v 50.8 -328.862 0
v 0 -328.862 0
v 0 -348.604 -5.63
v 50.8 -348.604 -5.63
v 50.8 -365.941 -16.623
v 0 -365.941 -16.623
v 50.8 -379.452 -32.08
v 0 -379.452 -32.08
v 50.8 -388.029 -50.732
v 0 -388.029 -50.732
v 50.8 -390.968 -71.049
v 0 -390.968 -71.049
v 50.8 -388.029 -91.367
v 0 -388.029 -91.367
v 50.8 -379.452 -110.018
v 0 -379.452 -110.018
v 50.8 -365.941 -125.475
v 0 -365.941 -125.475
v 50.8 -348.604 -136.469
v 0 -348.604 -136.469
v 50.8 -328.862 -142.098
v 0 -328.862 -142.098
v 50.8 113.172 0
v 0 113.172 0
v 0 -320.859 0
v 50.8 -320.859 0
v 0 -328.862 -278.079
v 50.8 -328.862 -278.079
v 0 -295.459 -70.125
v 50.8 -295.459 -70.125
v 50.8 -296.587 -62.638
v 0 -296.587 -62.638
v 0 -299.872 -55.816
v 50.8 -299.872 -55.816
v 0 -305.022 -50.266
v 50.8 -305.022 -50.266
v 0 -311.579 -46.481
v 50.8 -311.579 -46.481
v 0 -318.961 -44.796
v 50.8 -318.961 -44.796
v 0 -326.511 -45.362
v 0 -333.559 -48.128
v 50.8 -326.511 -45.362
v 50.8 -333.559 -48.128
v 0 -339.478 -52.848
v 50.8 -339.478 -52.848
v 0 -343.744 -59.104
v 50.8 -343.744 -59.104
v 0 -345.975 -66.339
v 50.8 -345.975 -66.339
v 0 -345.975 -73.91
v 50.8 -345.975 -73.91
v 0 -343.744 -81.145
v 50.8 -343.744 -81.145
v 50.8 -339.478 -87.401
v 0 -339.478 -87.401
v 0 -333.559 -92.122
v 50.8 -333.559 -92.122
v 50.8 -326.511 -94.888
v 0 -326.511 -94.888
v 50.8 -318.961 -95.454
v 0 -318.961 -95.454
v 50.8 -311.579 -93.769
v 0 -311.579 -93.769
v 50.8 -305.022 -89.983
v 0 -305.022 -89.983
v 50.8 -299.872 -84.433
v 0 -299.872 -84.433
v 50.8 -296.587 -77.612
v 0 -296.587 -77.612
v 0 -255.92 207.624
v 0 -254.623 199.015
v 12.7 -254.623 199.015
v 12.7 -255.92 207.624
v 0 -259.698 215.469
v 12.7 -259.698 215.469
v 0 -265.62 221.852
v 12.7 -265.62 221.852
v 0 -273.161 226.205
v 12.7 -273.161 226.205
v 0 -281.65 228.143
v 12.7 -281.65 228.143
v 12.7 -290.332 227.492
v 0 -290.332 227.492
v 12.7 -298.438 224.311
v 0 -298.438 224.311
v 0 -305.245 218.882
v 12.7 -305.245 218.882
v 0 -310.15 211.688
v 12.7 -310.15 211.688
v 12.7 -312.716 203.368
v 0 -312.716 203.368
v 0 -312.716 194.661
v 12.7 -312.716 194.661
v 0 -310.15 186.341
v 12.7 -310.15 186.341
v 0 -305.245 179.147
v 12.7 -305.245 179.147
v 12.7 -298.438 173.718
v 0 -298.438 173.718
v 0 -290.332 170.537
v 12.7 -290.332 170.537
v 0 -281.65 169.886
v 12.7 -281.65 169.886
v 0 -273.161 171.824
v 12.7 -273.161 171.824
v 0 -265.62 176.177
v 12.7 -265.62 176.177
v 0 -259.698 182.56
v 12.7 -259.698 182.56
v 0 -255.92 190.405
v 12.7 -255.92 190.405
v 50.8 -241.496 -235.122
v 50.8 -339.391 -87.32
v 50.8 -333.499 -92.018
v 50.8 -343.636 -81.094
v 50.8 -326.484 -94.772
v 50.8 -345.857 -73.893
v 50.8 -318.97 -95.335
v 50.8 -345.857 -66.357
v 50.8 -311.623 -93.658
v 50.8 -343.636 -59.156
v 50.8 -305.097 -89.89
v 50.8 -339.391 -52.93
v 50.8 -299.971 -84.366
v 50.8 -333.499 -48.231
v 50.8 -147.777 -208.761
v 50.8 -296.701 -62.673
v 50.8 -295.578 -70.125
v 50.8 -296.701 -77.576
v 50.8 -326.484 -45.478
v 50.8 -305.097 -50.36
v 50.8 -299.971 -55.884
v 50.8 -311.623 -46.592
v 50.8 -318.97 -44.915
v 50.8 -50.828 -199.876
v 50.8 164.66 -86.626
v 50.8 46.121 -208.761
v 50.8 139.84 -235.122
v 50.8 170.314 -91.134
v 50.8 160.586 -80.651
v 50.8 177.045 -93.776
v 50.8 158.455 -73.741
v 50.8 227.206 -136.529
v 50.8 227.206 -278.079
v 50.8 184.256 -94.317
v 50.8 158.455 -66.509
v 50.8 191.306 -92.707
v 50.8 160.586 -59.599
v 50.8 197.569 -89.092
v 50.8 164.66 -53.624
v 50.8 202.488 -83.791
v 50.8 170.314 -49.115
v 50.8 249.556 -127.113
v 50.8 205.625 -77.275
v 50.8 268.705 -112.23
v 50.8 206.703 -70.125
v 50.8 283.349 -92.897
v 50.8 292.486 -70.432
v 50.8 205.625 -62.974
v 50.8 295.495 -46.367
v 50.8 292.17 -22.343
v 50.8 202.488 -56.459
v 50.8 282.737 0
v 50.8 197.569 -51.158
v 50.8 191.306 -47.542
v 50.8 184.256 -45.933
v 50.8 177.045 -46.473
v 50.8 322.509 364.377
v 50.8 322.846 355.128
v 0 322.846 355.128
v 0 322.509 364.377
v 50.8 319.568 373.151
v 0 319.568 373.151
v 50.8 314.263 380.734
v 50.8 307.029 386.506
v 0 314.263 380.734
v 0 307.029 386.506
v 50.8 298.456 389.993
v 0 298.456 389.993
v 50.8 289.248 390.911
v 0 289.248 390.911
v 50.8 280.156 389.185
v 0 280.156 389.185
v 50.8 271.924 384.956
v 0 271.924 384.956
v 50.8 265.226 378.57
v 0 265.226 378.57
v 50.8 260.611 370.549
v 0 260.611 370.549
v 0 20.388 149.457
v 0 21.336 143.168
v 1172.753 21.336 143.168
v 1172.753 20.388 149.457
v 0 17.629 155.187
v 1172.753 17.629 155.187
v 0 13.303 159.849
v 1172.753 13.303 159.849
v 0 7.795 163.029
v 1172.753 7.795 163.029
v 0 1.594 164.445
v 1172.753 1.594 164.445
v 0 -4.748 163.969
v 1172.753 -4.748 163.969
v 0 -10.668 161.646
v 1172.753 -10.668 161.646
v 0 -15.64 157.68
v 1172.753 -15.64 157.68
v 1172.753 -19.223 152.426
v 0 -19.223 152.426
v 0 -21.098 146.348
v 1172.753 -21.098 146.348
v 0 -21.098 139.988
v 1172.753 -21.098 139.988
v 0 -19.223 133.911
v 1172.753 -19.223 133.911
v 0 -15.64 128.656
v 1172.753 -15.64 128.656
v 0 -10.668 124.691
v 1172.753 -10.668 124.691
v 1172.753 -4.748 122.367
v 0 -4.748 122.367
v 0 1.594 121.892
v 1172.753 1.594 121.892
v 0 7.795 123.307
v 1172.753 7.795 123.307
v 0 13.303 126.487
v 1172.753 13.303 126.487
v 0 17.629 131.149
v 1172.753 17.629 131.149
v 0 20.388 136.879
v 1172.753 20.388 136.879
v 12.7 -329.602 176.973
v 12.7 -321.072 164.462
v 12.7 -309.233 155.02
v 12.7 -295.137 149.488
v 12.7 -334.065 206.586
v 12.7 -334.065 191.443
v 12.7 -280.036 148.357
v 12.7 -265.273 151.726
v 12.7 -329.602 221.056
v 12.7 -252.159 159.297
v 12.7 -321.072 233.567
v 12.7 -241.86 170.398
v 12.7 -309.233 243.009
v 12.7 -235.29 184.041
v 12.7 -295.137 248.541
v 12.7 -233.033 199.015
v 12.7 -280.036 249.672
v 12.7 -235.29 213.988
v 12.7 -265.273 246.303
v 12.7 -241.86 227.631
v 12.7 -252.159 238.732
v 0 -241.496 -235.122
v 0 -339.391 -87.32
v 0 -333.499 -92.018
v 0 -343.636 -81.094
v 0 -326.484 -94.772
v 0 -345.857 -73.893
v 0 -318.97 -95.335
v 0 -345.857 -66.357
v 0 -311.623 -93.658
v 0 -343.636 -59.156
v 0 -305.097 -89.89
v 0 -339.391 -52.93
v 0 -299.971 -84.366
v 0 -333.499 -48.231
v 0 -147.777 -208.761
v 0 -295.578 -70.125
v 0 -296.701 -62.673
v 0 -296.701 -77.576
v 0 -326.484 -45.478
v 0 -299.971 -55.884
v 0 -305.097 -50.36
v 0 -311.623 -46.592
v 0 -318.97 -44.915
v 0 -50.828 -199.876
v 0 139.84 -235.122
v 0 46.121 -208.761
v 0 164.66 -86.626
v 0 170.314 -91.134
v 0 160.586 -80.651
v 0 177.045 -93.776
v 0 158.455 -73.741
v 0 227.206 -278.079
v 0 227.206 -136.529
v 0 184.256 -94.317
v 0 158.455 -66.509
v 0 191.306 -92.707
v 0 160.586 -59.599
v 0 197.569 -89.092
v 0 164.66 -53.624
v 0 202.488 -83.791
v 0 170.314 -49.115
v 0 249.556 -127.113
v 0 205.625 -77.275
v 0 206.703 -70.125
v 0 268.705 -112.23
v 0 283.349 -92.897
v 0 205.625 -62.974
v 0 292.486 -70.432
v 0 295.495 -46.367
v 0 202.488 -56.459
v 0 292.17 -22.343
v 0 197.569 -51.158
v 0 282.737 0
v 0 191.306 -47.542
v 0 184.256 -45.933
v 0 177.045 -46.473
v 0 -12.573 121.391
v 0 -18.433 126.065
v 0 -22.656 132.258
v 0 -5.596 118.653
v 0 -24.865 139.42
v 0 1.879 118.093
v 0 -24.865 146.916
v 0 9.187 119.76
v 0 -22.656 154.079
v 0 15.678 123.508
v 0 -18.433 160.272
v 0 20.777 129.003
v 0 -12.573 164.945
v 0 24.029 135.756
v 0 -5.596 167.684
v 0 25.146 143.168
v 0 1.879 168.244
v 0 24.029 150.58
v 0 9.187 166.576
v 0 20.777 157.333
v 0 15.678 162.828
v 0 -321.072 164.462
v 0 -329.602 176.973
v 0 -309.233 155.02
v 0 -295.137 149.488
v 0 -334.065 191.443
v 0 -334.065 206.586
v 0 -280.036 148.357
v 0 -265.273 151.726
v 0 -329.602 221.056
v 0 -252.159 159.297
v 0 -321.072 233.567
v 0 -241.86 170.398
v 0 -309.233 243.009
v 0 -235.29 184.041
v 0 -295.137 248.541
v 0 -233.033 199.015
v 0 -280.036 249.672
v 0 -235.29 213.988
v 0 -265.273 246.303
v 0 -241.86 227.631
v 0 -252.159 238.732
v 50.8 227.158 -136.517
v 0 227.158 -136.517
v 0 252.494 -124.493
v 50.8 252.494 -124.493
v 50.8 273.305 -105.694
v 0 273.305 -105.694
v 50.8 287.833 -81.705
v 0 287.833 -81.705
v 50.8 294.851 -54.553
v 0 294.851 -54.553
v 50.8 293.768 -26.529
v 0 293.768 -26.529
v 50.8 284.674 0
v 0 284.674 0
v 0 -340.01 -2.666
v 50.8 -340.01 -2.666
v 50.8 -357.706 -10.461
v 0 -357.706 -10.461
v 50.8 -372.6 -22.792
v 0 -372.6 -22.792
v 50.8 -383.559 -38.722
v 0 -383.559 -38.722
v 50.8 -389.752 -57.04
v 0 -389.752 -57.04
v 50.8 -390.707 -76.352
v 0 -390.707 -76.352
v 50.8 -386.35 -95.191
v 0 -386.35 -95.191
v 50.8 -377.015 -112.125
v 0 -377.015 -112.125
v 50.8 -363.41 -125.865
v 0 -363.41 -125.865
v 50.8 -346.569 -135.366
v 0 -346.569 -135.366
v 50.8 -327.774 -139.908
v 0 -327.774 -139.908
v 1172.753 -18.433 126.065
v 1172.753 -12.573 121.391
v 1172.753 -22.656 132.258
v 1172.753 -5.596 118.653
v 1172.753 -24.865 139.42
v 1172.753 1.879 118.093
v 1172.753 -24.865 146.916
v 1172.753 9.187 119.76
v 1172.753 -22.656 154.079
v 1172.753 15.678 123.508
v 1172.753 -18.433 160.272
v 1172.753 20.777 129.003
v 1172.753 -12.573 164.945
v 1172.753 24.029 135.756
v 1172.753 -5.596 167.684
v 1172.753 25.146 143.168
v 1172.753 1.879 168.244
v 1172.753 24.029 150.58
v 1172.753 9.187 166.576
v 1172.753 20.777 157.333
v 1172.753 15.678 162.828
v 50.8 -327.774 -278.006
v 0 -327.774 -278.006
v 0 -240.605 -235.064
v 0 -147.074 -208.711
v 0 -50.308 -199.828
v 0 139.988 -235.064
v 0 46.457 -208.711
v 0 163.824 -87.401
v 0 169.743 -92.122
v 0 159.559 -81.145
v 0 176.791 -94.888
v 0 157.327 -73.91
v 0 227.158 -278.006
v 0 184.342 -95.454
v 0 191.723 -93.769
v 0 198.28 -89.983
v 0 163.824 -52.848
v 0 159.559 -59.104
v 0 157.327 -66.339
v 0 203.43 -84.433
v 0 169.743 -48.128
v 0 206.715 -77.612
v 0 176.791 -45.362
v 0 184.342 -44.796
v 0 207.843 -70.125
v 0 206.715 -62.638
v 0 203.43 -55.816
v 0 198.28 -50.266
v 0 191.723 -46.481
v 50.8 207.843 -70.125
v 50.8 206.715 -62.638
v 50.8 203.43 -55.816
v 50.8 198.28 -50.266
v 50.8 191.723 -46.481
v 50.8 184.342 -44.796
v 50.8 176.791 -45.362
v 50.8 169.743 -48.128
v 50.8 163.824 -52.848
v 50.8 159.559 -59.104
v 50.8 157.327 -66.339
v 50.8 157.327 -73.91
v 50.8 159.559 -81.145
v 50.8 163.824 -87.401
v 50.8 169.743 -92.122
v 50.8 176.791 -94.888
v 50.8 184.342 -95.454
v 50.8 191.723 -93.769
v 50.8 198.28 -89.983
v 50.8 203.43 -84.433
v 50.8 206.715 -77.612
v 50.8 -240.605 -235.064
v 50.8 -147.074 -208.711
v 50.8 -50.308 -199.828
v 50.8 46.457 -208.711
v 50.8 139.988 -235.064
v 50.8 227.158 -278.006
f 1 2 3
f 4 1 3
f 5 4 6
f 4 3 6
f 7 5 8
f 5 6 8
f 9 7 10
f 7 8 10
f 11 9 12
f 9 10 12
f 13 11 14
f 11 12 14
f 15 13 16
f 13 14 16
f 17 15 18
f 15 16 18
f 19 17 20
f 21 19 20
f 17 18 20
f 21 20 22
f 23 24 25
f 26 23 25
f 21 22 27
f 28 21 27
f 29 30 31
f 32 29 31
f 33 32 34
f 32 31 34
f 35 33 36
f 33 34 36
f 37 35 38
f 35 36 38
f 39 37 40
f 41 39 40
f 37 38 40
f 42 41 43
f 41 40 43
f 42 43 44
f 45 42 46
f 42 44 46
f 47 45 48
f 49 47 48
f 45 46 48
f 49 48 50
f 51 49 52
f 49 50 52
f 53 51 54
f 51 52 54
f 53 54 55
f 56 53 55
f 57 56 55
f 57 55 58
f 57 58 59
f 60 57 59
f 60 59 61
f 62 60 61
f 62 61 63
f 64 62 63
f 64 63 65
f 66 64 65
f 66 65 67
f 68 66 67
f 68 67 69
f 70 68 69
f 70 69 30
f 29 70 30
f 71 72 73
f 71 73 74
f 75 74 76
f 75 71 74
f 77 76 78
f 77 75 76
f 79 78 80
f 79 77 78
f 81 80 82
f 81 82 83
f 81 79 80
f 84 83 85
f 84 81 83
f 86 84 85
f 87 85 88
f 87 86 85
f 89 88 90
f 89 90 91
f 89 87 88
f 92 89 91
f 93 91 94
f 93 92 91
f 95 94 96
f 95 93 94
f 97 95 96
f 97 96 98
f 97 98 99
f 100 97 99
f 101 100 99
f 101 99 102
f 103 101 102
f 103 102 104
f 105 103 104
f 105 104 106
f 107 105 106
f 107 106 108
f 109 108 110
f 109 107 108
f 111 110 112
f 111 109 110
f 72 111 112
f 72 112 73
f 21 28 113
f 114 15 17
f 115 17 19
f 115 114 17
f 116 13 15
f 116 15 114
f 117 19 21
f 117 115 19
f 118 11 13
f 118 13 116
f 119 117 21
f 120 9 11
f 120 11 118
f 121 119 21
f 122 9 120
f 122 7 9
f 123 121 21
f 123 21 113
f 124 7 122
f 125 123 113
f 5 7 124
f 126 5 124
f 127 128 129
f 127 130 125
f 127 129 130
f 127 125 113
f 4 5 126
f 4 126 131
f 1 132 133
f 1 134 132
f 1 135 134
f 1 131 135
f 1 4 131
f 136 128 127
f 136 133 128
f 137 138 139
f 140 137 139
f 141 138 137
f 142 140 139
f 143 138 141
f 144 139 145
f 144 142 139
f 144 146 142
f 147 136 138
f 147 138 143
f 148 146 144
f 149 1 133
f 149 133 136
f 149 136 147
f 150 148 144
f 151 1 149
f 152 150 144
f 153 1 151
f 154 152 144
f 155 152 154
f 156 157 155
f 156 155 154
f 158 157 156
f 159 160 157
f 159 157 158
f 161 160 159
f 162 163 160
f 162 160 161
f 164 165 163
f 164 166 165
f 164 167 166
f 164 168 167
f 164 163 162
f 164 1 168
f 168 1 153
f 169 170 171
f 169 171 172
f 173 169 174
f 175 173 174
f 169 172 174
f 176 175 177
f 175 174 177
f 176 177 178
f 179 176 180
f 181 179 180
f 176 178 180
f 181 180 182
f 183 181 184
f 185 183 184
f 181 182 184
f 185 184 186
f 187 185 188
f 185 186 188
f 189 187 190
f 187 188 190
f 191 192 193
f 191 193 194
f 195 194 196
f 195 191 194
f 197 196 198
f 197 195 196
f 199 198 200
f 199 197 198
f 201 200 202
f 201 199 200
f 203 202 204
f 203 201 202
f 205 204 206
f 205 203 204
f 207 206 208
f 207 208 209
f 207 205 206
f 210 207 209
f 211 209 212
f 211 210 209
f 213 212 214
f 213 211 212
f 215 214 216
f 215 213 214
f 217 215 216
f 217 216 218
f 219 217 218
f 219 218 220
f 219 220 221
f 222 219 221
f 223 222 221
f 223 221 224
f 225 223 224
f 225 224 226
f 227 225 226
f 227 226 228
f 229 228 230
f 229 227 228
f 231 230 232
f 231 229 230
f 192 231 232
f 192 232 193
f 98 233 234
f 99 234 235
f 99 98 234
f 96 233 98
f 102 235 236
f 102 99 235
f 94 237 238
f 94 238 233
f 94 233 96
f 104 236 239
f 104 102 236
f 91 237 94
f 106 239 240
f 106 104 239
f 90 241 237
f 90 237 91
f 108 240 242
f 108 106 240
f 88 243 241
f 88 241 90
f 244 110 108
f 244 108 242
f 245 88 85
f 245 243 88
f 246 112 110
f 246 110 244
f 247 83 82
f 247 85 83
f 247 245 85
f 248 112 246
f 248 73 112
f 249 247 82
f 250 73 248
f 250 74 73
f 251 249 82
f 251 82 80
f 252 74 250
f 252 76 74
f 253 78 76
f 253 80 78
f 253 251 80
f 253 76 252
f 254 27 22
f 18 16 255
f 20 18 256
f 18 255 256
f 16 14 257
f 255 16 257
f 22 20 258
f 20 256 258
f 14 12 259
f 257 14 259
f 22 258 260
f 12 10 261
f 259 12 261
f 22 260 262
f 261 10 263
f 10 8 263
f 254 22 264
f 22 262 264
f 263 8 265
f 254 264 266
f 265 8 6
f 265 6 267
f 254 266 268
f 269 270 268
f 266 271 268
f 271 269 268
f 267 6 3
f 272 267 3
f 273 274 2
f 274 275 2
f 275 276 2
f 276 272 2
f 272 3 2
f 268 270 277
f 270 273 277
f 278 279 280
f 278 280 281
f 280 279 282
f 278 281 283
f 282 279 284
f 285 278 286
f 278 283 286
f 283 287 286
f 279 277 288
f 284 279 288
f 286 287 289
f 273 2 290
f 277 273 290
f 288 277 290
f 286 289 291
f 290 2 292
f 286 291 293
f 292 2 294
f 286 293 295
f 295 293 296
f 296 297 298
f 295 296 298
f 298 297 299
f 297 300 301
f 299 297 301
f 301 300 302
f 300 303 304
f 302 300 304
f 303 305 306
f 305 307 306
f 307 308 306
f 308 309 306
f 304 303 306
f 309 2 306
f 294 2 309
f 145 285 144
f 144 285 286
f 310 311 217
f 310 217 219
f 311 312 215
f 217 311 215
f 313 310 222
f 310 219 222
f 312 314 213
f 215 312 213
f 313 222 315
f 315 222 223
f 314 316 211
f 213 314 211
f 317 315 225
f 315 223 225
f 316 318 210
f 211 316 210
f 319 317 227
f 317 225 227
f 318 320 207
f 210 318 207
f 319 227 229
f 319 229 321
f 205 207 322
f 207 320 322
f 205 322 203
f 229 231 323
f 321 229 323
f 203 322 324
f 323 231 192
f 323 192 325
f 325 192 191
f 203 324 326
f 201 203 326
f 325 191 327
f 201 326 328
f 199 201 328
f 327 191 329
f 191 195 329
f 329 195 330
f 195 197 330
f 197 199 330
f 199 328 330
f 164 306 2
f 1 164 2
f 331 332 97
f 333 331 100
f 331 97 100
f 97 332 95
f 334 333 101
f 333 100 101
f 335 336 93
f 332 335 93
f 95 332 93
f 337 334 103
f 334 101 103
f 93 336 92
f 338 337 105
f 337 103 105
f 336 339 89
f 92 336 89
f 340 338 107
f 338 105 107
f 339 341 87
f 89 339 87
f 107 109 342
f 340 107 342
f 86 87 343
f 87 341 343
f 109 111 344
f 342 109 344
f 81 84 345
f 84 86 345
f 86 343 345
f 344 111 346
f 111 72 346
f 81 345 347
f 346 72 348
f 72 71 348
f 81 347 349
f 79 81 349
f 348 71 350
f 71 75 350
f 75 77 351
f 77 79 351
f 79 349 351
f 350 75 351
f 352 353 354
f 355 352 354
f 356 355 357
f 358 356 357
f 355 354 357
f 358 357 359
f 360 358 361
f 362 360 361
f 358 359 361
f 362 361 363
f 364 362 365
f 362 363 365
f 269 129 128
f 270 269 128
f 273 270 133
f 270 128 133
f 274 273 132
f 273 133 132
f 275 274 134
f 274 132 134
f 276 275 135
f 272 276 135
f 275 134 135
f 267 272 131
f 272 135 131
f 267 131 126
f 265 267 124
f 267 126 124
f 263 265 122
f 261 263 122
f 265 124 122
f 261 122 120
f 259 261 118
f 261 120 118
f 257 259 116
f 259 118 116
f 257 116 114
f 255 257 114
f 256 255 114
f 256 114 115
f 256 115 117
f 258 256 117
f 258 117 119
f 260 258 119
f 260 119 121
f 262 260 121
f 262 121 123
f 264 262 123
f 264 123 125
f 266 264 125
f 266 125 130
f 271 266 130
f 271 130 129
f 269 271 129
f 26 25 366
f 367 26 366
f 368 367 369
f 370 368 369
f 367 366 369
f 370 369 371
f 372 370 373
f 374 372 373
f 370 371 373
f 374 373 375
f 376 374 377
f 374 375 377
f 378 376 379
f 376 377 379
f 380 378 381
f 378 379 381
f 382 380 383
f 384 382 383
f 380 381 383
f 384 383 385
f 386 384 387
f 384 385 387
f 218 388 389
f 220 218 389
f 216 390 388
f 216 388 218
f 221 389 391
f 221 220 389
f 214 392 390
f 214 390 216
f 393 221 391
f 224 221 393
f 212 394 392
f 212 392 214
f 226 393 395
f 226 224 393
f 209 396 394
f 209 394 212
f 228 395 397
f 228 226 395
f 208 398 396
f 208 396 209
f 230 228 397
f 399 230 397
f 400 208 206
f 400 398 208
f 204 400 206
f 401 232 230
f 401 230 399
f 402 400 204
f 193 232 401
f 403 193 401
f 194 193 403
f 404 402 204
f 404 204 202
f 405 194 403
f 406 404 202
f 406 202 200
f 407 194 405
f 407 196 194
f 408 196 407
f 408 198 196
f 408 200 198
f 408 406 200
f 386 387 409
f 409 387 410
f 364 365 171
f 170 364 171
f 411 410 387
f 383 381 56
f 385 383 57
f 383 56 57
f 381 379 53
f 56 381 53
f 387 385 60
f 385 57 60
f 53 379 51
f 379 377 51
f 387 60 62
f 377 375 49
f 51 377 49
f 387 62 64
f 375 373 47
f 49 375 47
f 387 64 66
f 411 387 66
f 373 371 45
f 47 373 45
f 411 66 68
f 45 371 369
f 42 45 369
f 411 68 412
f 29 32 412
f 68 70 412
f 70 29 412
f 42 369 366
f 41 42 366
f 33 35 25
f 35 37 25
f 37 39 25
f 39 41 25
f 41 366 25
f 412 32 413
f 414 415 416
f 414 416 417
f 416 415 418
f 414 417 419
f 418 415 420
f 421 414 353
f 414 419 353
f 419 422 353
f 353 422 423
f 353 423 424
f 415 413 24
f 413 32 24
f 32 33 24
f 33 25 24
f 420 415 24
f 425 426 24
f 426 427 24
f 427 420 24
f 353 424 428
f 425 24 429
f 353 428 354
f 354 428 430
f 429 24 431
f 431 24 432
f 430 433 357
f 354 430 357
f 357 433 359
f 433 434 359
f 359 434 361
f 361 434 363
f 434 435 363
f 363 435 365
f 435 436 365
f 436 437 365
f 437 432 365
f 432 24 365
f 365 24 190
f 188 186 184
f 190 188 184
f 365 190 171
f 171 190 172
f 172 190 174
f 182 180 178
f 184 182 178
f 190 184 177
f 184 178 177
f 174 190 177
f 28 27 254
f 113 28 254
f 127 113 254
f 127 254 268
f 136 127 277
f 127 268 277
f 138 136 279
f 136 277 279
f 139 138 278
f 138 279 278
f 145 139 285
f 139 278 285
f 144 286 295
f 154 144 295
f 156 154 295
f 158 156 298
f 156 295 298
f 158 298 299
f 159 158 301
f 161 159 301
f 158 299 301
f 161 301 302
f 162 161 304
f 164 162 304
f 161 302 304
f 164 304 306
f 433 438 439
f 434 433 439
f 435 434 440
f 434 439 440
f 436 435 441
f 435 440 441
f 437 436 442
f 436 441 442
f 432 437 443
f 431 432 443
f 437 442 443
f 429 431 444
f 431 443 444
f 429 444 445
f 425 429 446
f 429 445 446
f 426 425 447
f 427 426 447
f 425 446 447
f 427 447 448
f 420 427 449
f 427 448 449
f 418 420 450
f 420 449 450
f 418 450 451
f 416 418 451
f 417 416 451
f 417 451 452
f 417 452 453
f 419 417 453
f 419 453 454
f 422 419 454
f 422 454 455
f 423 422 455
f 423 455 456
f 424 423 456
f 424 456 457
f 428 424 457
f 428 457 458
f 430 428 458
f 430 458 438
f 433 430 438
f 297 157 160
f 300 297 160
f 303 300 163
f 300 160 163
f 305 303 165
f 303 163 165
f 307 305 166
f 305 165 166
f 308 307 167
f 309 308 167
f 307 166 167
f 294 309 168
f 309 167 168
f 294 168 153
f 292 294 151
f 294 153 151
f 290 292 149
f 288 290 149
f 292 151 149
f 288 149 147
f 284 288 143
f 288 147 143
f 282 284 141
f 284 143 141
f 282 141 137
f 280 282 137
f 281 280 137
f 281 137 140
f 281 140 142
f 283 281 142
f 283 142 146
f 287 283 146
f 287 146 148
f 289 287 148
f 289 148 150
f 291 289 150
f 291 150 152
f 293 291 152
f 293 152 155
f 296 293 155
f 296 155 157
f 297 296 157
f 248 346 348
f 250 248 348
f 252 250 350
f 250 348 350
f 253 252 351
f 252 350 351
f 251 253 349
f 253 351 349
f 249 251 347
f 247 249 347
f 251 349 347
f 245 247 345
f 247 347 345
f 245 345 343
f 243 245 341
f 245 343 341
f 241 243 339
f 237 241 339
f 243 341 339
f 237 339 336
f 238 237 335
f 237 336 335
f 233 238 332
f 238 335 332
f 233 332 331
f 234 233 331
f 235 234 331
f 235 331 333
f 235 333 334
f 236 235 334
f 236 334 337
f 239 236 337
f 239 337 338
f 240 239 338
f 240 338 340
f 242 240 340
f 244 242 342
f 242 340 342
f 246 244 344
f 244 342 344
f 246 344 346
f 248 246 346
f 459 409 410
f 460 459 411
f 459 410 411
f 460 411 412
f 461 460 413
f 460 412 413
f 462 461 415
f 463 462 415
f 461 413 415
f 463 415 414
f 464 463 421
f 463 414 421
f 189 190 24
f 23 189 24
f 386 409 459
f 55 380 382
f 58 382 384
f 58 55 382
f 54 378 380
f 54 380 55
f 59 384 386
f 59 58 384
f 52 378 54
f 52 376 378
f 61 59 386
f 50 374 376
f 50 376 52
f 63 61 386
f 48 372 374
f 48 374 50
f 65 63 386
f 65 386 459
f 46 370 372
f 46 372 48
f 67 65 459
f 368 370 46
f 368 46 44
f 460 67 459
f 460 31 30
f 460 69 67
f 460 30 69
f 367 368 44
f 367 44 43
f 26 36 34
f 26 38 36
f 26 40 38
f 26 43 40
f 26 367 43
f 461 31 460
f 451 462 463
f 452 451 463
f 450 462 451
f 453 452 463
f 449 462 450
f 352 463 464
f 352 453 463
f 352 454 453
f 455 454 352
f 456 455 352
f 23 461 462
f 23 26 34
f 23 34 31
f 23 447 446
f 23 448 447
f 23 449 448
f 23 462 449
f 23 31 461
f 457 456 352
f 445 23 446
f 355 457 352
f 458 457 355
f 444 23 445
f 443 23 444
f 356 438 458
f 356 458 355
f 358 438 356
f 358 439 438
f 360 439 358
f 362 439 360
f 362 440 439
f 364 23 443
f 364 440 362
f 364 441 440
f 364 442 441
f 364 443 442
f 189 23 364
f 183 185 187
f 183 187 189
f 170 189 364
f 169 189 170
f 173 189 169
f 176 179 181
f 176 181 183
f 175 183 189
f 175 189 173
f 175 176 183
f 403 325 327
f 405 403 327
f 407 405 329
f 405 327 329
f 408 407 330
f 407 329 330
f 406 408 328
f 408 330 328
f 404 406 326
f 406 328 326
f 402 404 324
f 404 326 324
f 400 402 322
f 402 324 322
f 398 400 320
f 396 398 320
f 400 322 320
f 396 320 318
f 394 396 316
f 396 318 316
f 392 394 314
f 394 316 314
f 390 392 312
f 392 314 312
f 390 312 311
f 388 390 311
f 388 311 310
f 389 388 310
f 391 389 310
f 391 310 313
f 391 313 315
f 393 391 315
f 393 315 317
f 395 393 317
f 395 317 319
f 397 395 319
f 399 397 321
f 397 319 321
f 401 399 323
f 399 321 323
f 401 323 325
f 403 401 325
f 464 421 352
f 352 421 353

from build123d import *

# Parameters (mm, degrees)
F1_DEPTH  = 50.8
F3_DEPTH  = 50.8
F4_R      = 25.4
F5_DEPTH  = 50.801
F6_R      = 50.8
F6_R_2    = 29.21
F7_DEPTH  = 12.7
F8_R      = 25.146
F8_R_2    = 21.336
F9_DEPTH  = 1172.753215
F11_DEPTH = 50.8
F12_R     = 25.280586
F12_R_2   = 24.259584
F13_DEPTH = 50.801


with BuildPart() as f1:
    # F0 (on Right) → F1 (new body)
    with BuildSketch(Plane.YZ):
        with BuildLine():
            Line((113.172458, 0), (0, 0))
            Line((0, 0), (-320.858896, 0))
            ThreePointArc((-320.858896, 0), (-390.983701, -70.124805), (-320.858896, -140.24961))
            Line((-320.858896, -140.24961), (208.70465, -140.24961))
            ThreePointArc((208.70465, -140.24961), (283.753727, -90.20157), (284.674048, 0))
            Line((284.674048, 0), (322.845772, 355.128451))
            ThreePointArc((322.845772, 355.128451), (298.456343, 389.993239), (260.610521, 370.548666))
            Line((260.610521, 370.548666), (113.172458, 0))
        make_face()
    extrude(amount=F1_DEPTH)

    # F2 (on Right) → F3 (join)
    with BuildSketch(Plane.YZ):
        with BuildLine():
            Line((-327.773929, -120.990053), (-327.773929, -142.130882))
            Line((-327.773929, -142.130882), (-327.773929, -278.005511))
            ThreePointArc((-327.773929, -278.005511), (-50.308123, -199.827734), (227.157682, -278.005511))
            Line((227.157682, -278.005511), (227.157682, -120.990053))
            Line((227.157682, -120.990053), (-327.773929, -120.990053))
        make_face()
    extrude(amount=F3_DEPTH)

    # F4 (on face) → F5 (cut, through all)
    with BuildSketch(Plane.YZ.offset(50.8)):
        with Locations((-320.858896, -70.124805)):
            Circle(F4_R)
        with Locations((182.443417, -70.124805)):
            Circle(F4_R)
    extrude(amount=-F5_DEPTH, mode=Mode.SUBTRACT)


with BuildPart() as f7:
    # F6 (on Right) → F7 (new body)
    with BuildSketch(Plane.YZ):
        with Locations((-283.83261, 199.014515)):
            Circle(F6_R)
        with Locations((-283.83261, 199.014515)):
            Circle(F6_R_2, mode=Mode.SUBTRACT)
    extrude(amount=F7_DEPTH)


with BuildPart() as f9:
    # F8 (on Right) → F9 (new body)
    with BuildSketch(Plane.YZ):
        with Locations((0, 143.168248)):
            Circle(F8_R)
        with Locations((0, 143.168248)):
            Circle(F8_R_2, mode=Mode.SUBTRACT)
    extrude(amount=F9_DEPTH)


with BuildPart() as f11:
    # F10 (on Right) → F11 (new body)
    with BuildSketch(Plane.YZ):
        with BuildLine():
            Line((282.737374, 0), (0, 0))
            Line((0, 0), (-328.861833, 0))
            ThreePointArc((-328.861833, 0), (-390.968115, -71.049184), (-328.861833, -142.098367))
            Line((-328.861833, -142.098367), (-328.861833, -278.078973))
            ThreePointArc((-328.861833, -278.078973), (-50.828099, -199.875837), (227.205634, -278.078973))
            Line((227.205634, -278.078973), (227.205634, -136.528537))
            ThreePointArc((227.205634, -136.528537), (288.653926, -81.964287), (282.737374, 0))
        make_face()
    extrude(amount=F11_DEPTH)

    # F12 (on face) → F13 (cut, through all)
    with BuildSketch(Plane.YZ.offset(50.8)):
        with Locations((-320.858896, -70.124805)):
            Circle(F12_R)
        with Locations((182.443417, -70.124805)):
            Circle(F12_R_2)
    extrude(amount=-F13_DEPTH, mode=Mode.SUBTRACT)


solid = Compound([f1.part, f7.part, f9.part, f11.part])
